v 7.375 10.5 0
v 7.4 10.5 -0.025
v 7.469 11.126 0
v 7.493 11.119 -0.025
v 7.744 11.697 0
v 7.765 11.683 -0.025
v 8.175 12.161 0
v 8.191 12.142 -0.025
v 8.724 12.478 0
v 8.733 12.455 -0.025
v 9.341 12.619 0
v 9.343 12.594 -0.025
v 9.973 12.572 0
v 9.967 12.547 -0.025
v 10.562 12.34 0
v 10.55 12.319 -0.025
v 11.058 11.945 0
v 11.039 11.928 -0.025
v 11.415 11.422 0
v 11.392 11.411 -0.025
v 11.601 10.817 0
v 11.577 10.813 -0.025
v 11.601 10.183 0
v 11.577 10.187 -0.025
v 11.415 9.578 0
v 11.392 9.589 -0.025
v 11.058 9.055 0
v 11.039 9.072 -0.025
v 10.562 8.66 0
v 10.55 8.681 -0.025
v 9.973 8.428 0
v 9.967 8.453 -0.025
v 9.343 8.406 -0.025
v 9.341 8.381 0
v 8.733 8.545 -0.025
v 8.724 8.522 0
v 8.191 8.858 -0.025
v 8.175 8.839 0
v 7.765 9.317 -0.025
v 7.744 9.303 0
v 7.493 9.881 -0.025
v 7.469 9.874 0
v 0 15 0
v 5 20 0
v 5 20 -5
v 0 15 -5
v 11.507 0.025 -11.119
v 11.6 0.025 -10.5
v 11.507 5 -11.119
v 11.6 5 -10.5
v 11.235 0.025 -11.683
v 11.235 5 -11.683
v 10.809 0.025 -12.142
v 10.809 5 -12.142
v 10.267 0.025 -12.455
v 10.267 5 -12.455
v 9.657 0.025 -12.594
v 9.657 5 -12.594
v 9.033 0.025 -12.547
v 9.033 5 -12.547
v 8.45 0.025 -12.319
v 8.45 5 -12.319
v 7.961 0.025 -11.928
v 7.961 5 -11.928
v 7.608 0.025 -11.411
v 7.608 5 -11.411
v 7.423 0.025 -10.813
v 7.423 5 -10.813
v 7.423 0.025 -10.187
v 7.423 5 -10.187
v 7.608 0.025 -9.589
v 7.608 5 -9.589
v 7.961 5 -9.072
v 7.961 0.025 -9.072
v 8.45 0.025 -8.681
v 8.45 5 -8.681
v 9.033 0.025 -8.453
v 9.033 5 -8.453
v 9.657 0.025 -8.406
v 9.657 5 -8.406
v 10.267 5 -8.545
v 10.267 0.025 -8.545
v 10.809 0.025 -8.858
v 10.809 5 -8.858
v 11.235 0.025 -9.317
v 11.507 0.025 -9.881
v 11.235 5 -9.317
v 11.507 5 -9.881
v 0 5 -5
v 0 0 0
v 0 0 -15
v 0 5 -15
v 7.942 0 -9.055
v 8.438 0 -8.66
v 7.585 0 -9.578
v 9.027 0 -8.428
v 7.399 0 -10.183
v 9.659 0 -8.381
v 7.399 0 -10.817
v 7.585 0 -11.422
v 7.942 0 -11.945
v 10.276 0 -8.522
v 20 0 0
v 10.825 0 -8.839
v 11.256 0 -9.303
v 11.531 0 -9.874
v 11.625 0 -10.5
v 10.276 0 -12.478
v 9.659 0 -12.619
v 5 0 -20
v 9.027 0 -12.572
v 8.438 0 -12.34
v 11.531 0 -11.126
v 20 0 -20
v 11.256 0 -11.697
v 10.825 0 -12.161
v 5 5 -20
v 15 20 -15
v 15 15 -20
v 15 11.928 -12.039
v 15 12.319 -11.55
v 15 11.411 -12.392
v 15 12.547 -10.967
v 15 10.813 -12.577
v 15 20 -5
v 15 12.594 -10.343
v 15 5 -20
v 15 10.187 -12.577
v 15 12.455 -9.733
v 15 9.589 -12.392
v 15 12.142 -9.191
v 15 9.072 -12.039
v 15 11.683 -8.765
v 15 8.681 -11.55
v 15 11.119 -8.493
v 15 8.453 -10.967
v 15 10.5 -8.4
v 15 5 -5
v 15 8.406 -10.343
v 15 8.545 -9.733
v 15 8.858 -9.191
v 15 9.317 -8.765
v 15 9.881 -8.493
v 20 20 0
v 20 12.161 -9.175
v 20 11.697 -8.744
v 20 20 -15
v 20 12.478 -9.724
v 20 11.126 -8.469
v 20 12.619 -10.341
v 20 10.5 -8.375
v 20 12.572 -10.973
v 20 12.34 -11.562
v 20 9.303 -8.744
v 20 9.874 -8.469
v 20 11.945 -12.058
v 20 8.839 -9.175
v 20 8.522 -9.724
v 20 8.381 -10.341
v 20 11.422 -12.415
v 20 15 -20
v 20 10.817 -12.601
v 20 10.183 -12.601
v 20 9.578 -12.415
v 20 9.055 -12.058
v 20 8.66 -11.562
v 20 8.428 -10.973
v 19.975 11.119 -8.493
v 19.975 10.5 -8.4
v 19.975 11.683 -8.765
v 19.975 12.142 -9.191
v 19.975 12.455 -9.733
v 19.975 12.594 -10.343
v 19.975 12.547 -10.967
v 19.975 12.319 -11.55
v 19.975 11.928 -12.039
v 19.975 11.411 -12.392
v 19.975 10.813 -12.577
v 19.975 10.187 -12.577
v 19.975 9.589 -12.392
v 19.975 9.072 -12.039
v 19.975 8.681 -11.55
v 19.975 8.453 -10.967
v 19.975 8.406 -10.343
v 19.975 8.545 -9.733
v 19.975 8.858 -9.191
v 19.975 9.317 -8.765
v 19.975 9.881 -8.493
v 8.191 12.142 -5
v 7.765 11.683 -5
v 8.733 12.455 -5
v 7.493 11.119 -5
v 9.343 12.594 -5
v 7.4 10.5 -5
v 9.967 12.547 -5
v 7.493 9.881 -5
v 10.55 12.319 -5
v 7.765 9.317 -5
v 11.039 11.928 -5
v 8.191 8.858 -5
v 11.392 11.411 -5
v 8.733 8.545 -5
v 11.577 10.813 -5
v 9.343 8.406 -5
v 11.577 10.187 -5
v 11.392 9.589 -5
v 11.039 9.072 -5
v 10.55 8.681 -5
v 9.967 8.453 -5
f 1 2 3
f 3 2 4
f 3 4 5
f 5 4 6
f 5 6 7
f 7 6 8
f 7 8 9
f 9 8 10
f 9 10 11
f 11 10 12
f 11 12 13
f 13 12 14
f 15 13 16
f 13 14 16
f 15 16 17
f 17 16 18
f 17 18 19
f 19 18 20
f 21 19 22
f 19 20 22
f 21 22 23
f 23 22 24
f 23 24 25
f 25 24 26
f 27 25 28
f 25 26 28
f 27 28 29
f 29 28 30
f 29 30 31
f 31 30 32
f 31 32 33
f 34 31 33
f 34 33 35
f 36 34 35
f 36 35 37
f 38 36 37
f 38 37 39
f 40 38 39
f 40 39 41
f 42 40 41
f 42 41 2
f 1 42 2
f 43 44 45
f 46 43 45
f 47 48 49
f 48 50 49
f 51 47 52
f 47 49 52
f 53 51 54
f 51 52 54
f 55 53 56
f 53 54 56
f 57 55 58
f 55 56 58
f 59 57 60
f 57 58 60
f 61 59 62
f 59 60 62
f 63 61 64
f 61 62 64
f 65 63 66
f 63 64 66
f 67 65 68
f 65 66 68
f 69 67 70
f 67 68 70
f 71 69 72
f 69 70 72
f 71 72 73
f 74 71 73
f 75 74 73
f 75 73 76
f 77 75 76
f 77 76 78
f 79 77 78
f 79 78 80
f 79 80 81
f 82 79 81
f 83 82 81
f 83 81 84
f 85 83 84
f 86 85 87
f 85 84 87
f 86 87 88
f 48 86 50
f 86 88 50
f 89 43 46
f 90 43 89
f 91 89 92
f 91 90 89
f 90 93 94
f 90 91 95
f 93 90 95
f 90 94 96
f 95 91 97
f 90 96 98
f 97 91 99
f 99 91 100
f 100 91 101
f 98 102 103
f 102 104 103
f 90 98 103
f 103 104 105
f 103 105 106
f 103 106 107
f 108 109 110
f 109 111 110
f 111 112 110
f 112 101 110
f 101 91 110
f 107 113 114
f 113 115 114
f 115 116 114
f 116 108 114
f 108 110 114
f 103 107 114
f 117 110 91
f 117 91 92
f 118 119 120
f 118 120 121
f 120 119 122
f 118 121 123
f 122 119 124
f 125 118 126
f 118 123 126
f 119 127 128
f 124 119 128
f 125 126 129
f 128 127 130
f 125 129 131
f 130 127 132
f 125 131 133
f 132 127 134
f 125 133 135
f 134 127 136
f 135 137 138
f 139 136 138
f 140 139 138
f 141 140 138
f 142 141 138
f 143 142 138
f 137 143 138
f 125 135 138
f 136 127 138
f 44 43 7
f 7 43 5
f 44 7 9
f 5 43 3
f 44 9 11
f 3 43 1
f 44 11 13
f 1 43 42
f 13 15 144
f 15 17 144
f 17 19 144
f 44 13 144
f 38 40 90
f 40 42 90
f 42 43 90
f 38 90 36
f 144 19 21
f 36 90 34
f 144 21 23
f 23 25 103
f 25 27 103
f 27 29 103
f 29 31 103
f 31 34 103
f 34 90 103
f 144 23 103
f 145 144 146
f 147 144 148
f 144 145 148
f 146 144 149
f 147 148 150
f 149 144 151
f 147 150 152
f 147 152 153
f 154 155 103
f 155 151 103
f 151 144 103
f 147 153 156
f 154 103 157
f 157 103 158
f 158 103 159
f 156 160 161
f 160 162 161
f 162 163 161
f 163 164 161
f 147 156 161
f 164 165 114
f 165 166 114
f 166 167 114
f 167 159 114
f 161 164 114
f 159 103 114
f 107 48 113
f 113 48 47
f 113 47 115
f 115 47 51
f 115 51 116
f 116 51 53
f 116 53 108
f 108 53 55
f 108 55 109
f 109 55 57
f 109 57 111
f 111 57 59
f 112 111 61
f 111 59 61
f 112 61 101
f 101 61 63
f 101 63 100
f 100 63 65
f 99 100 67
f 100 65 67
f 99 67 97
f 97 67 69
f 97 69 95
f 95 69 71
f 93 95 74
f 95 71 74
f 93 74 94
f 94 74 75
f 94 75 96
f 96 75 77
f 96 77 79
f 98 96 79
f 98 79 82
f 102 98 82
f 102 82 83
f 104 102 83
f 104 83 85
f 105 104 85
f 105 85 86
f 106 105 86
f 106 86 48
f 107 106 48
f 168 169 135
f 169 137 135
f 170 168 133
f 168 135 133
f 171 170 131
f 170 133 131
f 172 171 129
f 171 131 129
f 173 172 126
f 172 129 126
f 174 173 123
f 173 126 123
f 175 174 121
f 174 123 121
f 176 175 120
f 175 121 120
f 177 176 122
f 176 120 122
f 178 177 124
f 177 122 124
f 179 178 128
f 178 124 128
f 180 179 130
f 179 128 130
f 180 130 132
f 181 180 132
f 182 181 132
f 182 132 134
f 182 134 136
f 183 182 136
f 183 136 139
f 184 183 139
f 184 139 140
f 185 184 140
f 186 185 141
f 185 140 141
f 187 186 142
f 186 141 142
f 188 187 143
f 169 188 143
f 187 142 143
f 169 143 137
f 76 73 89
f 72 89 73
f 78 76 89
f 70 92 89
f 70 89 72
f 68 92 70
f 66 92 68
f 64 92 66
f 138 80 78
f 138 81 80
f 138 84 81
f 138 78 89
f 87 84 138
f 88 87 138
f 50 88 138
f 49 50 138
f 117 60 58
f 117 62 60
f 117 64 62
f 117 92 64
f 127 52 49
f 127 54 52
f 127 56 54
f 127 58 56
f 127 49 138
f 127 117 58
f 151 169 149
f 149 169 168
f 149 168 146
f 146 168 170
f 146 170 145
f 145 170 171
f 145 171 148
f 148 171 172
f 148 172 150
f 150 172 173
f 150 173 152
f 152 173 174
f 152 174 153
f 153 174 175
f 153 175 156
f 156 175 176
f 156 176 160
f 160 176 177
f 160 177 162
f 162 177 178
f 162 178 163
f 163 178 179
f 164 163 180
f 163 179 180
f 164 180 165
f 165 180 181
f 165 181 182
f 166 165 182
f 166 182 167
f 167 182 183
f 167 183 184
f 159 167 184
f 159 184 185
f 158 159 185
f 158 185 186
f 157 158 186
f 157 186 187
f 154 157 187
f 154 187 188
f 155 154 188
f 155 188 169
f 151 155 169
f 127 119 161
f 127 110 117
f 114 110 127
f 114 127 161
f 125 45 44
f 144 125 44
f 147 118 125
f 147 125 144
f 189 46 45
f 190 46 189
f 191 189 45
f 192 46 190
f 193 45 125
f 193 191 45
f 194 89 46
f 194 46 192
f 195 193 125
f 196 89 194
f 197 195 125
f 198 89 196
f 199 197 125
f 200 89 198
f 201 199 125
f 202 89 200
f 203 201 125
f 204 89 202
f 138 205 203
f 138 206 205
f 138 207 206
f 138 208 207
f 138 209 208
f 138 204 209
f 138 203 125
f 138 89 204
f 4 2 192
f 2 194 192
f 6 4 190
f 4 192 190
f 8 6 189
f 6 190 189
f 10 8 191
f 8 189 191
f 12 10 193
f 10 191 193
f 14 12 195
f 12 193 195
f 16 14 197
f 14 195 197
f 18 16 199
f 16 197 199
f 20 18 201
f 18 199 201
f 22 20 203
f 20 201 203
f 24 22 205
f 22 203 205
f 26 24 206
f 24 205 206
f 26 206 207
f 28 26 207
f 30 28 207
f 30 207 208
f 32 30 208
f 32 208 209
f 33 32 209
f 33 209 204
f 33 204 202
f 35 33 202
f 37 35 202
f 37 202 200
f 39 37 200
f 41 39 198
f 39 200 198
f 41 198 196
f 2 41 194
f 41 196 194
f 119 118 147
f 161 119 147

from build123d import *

# Parameters (mm, degrees)
BOSS_EXTRUDE1_DEPTH                   = 5
TAP_DRILL_FOR_M5X0_8_TAP1_D           = 4.2
TAP_DRILL_FOR_M5X0_8_TAP1_CSINK_D     = 4.25
TAP_DRILL_FOR_M5X0_8_TAP1_CSINK_ANGLE = 90
SKETCH4_W                             = 5
SKETCH4_H                             = 15
SKETCH4_H_2                           = 5
SKETCH4_W_2                           = 15
BOSS_EXTRUDE2_DEPTH                   = 15
TAP_DRILL_FOR_M5X0_8_TAP2_D           = 4.2
TAP_DRILL_FOR_M5X0_8_TAP2_CSINK_D     = 4.25
TAP_DRILL_FOR_M5X0_8_TAP2_CSINK_ANGLE = 90
TAP_DRILL_FOR_M5X0_8_TAP3_D           = 4.2
TAP_DRILL_FOR_M5X0_8_TAP3_CSINK_D     = 4.25
TAP_DRILL_FOR_M5X0_8_TAP3_CSINK_ANGLE = 90
CHAMFER1_SIZE                         = 5


with BuildPart() as part:
    # Sketch1 → Boss-Extrude1 (new body)
    with BuildSketch(Plane(origin=(0, 0, 0), x_dir=(1, 0, 0), z_dir=(0, 1, 0))):
        Polygon((9.5, 0), (20, 0), (20, 20), (0, 20), (0, 0), align=None)
    extrude(amount=BOSS_EXTRUDE1_DEPTH)

    # Tap Drill for M5x0.8 Tap1 (through all)
    with Locations(Plane(origin=(0, 0, 0), x_dir=(-1, 0, 0), z_dir=(0, -1, 0))):
        with Locations((-9.5, 10.5)):
            CounterSinkHole(TAP_DRILL_FOR_M5X0_8_TAP1_D / 2, TAP_DRILL_FOR_M5X0_8_TAP1_CSINK_D / 2, counter_sink_angle=TAP_DRILL_FOR_M5X0_8_TAP1_CSINK_ANGLE)

    # Sketch4 → Boss-Extrude2 (add)
    with BuildSketch(Plane(origin=(0, 5, 0), x_dir=(1, 0, 0), z_dir=(0, 1, 0))):
        with Locations((17.5, 12.5)):
            Rectangle(SKETCH4_W, SKETCH4_H)
        with Locations((17.5, 2.5)):
            Rectangle(SKETCH4_W, SKETCH4_H_2)
        with Locations((7.5, 2.5)):
            Rectangle(SKETCH4_W_2, SKETCH4_H_2)
    extrude(amount=BOSS_EXTRUDE2_DEPTH)

    # Tap Drill for M5x0.8 Tap2 (through all)
    with Locations(Plane.XY):
        with Locations((9.5, 10.5)):
            CounterSinkHole(TAP_DRILL_FOR_M5X0_8_TAP2_D / 2, TAP_DRILL_FOR_M5X0_8_TAP2_CSINK_D / 2, counter_sink_angle=TAP_DRILL_FOR_M5X0_8_TAP2_CSINK_ANGLE)

    # Tap Drill for M5x0.8 Tap3 (through all)
    with Locations(Plane(origin=(20, 0, 0), x_dir=(0, 0, -1), z_dir=(1, 0, 0))):
        with Locations((10.5, 10.5)):
            CounterSinkHole(TAP_DRILL_FOR_M5X0_8_TAP3_D / 2, TAP_DRILL_FOR_M5X0_8_TAP3_CSINK_D / 2, counter_sink_angle=TAP_DRILL_FOR_M5X0_8_TAP3_CSINK_ANGLE)

    # Chamfer1
    chamfer1_edges = [part.edges().sort_by_distance(p)[0] for p in [
        (0, 20, -2.5),
        (17.5, 20, -20),
        (0, 2.5, -20),
    ]]
    chamfer(chamfer1_edges, length=CHAMFER1_SIZE)


solid = part.part
